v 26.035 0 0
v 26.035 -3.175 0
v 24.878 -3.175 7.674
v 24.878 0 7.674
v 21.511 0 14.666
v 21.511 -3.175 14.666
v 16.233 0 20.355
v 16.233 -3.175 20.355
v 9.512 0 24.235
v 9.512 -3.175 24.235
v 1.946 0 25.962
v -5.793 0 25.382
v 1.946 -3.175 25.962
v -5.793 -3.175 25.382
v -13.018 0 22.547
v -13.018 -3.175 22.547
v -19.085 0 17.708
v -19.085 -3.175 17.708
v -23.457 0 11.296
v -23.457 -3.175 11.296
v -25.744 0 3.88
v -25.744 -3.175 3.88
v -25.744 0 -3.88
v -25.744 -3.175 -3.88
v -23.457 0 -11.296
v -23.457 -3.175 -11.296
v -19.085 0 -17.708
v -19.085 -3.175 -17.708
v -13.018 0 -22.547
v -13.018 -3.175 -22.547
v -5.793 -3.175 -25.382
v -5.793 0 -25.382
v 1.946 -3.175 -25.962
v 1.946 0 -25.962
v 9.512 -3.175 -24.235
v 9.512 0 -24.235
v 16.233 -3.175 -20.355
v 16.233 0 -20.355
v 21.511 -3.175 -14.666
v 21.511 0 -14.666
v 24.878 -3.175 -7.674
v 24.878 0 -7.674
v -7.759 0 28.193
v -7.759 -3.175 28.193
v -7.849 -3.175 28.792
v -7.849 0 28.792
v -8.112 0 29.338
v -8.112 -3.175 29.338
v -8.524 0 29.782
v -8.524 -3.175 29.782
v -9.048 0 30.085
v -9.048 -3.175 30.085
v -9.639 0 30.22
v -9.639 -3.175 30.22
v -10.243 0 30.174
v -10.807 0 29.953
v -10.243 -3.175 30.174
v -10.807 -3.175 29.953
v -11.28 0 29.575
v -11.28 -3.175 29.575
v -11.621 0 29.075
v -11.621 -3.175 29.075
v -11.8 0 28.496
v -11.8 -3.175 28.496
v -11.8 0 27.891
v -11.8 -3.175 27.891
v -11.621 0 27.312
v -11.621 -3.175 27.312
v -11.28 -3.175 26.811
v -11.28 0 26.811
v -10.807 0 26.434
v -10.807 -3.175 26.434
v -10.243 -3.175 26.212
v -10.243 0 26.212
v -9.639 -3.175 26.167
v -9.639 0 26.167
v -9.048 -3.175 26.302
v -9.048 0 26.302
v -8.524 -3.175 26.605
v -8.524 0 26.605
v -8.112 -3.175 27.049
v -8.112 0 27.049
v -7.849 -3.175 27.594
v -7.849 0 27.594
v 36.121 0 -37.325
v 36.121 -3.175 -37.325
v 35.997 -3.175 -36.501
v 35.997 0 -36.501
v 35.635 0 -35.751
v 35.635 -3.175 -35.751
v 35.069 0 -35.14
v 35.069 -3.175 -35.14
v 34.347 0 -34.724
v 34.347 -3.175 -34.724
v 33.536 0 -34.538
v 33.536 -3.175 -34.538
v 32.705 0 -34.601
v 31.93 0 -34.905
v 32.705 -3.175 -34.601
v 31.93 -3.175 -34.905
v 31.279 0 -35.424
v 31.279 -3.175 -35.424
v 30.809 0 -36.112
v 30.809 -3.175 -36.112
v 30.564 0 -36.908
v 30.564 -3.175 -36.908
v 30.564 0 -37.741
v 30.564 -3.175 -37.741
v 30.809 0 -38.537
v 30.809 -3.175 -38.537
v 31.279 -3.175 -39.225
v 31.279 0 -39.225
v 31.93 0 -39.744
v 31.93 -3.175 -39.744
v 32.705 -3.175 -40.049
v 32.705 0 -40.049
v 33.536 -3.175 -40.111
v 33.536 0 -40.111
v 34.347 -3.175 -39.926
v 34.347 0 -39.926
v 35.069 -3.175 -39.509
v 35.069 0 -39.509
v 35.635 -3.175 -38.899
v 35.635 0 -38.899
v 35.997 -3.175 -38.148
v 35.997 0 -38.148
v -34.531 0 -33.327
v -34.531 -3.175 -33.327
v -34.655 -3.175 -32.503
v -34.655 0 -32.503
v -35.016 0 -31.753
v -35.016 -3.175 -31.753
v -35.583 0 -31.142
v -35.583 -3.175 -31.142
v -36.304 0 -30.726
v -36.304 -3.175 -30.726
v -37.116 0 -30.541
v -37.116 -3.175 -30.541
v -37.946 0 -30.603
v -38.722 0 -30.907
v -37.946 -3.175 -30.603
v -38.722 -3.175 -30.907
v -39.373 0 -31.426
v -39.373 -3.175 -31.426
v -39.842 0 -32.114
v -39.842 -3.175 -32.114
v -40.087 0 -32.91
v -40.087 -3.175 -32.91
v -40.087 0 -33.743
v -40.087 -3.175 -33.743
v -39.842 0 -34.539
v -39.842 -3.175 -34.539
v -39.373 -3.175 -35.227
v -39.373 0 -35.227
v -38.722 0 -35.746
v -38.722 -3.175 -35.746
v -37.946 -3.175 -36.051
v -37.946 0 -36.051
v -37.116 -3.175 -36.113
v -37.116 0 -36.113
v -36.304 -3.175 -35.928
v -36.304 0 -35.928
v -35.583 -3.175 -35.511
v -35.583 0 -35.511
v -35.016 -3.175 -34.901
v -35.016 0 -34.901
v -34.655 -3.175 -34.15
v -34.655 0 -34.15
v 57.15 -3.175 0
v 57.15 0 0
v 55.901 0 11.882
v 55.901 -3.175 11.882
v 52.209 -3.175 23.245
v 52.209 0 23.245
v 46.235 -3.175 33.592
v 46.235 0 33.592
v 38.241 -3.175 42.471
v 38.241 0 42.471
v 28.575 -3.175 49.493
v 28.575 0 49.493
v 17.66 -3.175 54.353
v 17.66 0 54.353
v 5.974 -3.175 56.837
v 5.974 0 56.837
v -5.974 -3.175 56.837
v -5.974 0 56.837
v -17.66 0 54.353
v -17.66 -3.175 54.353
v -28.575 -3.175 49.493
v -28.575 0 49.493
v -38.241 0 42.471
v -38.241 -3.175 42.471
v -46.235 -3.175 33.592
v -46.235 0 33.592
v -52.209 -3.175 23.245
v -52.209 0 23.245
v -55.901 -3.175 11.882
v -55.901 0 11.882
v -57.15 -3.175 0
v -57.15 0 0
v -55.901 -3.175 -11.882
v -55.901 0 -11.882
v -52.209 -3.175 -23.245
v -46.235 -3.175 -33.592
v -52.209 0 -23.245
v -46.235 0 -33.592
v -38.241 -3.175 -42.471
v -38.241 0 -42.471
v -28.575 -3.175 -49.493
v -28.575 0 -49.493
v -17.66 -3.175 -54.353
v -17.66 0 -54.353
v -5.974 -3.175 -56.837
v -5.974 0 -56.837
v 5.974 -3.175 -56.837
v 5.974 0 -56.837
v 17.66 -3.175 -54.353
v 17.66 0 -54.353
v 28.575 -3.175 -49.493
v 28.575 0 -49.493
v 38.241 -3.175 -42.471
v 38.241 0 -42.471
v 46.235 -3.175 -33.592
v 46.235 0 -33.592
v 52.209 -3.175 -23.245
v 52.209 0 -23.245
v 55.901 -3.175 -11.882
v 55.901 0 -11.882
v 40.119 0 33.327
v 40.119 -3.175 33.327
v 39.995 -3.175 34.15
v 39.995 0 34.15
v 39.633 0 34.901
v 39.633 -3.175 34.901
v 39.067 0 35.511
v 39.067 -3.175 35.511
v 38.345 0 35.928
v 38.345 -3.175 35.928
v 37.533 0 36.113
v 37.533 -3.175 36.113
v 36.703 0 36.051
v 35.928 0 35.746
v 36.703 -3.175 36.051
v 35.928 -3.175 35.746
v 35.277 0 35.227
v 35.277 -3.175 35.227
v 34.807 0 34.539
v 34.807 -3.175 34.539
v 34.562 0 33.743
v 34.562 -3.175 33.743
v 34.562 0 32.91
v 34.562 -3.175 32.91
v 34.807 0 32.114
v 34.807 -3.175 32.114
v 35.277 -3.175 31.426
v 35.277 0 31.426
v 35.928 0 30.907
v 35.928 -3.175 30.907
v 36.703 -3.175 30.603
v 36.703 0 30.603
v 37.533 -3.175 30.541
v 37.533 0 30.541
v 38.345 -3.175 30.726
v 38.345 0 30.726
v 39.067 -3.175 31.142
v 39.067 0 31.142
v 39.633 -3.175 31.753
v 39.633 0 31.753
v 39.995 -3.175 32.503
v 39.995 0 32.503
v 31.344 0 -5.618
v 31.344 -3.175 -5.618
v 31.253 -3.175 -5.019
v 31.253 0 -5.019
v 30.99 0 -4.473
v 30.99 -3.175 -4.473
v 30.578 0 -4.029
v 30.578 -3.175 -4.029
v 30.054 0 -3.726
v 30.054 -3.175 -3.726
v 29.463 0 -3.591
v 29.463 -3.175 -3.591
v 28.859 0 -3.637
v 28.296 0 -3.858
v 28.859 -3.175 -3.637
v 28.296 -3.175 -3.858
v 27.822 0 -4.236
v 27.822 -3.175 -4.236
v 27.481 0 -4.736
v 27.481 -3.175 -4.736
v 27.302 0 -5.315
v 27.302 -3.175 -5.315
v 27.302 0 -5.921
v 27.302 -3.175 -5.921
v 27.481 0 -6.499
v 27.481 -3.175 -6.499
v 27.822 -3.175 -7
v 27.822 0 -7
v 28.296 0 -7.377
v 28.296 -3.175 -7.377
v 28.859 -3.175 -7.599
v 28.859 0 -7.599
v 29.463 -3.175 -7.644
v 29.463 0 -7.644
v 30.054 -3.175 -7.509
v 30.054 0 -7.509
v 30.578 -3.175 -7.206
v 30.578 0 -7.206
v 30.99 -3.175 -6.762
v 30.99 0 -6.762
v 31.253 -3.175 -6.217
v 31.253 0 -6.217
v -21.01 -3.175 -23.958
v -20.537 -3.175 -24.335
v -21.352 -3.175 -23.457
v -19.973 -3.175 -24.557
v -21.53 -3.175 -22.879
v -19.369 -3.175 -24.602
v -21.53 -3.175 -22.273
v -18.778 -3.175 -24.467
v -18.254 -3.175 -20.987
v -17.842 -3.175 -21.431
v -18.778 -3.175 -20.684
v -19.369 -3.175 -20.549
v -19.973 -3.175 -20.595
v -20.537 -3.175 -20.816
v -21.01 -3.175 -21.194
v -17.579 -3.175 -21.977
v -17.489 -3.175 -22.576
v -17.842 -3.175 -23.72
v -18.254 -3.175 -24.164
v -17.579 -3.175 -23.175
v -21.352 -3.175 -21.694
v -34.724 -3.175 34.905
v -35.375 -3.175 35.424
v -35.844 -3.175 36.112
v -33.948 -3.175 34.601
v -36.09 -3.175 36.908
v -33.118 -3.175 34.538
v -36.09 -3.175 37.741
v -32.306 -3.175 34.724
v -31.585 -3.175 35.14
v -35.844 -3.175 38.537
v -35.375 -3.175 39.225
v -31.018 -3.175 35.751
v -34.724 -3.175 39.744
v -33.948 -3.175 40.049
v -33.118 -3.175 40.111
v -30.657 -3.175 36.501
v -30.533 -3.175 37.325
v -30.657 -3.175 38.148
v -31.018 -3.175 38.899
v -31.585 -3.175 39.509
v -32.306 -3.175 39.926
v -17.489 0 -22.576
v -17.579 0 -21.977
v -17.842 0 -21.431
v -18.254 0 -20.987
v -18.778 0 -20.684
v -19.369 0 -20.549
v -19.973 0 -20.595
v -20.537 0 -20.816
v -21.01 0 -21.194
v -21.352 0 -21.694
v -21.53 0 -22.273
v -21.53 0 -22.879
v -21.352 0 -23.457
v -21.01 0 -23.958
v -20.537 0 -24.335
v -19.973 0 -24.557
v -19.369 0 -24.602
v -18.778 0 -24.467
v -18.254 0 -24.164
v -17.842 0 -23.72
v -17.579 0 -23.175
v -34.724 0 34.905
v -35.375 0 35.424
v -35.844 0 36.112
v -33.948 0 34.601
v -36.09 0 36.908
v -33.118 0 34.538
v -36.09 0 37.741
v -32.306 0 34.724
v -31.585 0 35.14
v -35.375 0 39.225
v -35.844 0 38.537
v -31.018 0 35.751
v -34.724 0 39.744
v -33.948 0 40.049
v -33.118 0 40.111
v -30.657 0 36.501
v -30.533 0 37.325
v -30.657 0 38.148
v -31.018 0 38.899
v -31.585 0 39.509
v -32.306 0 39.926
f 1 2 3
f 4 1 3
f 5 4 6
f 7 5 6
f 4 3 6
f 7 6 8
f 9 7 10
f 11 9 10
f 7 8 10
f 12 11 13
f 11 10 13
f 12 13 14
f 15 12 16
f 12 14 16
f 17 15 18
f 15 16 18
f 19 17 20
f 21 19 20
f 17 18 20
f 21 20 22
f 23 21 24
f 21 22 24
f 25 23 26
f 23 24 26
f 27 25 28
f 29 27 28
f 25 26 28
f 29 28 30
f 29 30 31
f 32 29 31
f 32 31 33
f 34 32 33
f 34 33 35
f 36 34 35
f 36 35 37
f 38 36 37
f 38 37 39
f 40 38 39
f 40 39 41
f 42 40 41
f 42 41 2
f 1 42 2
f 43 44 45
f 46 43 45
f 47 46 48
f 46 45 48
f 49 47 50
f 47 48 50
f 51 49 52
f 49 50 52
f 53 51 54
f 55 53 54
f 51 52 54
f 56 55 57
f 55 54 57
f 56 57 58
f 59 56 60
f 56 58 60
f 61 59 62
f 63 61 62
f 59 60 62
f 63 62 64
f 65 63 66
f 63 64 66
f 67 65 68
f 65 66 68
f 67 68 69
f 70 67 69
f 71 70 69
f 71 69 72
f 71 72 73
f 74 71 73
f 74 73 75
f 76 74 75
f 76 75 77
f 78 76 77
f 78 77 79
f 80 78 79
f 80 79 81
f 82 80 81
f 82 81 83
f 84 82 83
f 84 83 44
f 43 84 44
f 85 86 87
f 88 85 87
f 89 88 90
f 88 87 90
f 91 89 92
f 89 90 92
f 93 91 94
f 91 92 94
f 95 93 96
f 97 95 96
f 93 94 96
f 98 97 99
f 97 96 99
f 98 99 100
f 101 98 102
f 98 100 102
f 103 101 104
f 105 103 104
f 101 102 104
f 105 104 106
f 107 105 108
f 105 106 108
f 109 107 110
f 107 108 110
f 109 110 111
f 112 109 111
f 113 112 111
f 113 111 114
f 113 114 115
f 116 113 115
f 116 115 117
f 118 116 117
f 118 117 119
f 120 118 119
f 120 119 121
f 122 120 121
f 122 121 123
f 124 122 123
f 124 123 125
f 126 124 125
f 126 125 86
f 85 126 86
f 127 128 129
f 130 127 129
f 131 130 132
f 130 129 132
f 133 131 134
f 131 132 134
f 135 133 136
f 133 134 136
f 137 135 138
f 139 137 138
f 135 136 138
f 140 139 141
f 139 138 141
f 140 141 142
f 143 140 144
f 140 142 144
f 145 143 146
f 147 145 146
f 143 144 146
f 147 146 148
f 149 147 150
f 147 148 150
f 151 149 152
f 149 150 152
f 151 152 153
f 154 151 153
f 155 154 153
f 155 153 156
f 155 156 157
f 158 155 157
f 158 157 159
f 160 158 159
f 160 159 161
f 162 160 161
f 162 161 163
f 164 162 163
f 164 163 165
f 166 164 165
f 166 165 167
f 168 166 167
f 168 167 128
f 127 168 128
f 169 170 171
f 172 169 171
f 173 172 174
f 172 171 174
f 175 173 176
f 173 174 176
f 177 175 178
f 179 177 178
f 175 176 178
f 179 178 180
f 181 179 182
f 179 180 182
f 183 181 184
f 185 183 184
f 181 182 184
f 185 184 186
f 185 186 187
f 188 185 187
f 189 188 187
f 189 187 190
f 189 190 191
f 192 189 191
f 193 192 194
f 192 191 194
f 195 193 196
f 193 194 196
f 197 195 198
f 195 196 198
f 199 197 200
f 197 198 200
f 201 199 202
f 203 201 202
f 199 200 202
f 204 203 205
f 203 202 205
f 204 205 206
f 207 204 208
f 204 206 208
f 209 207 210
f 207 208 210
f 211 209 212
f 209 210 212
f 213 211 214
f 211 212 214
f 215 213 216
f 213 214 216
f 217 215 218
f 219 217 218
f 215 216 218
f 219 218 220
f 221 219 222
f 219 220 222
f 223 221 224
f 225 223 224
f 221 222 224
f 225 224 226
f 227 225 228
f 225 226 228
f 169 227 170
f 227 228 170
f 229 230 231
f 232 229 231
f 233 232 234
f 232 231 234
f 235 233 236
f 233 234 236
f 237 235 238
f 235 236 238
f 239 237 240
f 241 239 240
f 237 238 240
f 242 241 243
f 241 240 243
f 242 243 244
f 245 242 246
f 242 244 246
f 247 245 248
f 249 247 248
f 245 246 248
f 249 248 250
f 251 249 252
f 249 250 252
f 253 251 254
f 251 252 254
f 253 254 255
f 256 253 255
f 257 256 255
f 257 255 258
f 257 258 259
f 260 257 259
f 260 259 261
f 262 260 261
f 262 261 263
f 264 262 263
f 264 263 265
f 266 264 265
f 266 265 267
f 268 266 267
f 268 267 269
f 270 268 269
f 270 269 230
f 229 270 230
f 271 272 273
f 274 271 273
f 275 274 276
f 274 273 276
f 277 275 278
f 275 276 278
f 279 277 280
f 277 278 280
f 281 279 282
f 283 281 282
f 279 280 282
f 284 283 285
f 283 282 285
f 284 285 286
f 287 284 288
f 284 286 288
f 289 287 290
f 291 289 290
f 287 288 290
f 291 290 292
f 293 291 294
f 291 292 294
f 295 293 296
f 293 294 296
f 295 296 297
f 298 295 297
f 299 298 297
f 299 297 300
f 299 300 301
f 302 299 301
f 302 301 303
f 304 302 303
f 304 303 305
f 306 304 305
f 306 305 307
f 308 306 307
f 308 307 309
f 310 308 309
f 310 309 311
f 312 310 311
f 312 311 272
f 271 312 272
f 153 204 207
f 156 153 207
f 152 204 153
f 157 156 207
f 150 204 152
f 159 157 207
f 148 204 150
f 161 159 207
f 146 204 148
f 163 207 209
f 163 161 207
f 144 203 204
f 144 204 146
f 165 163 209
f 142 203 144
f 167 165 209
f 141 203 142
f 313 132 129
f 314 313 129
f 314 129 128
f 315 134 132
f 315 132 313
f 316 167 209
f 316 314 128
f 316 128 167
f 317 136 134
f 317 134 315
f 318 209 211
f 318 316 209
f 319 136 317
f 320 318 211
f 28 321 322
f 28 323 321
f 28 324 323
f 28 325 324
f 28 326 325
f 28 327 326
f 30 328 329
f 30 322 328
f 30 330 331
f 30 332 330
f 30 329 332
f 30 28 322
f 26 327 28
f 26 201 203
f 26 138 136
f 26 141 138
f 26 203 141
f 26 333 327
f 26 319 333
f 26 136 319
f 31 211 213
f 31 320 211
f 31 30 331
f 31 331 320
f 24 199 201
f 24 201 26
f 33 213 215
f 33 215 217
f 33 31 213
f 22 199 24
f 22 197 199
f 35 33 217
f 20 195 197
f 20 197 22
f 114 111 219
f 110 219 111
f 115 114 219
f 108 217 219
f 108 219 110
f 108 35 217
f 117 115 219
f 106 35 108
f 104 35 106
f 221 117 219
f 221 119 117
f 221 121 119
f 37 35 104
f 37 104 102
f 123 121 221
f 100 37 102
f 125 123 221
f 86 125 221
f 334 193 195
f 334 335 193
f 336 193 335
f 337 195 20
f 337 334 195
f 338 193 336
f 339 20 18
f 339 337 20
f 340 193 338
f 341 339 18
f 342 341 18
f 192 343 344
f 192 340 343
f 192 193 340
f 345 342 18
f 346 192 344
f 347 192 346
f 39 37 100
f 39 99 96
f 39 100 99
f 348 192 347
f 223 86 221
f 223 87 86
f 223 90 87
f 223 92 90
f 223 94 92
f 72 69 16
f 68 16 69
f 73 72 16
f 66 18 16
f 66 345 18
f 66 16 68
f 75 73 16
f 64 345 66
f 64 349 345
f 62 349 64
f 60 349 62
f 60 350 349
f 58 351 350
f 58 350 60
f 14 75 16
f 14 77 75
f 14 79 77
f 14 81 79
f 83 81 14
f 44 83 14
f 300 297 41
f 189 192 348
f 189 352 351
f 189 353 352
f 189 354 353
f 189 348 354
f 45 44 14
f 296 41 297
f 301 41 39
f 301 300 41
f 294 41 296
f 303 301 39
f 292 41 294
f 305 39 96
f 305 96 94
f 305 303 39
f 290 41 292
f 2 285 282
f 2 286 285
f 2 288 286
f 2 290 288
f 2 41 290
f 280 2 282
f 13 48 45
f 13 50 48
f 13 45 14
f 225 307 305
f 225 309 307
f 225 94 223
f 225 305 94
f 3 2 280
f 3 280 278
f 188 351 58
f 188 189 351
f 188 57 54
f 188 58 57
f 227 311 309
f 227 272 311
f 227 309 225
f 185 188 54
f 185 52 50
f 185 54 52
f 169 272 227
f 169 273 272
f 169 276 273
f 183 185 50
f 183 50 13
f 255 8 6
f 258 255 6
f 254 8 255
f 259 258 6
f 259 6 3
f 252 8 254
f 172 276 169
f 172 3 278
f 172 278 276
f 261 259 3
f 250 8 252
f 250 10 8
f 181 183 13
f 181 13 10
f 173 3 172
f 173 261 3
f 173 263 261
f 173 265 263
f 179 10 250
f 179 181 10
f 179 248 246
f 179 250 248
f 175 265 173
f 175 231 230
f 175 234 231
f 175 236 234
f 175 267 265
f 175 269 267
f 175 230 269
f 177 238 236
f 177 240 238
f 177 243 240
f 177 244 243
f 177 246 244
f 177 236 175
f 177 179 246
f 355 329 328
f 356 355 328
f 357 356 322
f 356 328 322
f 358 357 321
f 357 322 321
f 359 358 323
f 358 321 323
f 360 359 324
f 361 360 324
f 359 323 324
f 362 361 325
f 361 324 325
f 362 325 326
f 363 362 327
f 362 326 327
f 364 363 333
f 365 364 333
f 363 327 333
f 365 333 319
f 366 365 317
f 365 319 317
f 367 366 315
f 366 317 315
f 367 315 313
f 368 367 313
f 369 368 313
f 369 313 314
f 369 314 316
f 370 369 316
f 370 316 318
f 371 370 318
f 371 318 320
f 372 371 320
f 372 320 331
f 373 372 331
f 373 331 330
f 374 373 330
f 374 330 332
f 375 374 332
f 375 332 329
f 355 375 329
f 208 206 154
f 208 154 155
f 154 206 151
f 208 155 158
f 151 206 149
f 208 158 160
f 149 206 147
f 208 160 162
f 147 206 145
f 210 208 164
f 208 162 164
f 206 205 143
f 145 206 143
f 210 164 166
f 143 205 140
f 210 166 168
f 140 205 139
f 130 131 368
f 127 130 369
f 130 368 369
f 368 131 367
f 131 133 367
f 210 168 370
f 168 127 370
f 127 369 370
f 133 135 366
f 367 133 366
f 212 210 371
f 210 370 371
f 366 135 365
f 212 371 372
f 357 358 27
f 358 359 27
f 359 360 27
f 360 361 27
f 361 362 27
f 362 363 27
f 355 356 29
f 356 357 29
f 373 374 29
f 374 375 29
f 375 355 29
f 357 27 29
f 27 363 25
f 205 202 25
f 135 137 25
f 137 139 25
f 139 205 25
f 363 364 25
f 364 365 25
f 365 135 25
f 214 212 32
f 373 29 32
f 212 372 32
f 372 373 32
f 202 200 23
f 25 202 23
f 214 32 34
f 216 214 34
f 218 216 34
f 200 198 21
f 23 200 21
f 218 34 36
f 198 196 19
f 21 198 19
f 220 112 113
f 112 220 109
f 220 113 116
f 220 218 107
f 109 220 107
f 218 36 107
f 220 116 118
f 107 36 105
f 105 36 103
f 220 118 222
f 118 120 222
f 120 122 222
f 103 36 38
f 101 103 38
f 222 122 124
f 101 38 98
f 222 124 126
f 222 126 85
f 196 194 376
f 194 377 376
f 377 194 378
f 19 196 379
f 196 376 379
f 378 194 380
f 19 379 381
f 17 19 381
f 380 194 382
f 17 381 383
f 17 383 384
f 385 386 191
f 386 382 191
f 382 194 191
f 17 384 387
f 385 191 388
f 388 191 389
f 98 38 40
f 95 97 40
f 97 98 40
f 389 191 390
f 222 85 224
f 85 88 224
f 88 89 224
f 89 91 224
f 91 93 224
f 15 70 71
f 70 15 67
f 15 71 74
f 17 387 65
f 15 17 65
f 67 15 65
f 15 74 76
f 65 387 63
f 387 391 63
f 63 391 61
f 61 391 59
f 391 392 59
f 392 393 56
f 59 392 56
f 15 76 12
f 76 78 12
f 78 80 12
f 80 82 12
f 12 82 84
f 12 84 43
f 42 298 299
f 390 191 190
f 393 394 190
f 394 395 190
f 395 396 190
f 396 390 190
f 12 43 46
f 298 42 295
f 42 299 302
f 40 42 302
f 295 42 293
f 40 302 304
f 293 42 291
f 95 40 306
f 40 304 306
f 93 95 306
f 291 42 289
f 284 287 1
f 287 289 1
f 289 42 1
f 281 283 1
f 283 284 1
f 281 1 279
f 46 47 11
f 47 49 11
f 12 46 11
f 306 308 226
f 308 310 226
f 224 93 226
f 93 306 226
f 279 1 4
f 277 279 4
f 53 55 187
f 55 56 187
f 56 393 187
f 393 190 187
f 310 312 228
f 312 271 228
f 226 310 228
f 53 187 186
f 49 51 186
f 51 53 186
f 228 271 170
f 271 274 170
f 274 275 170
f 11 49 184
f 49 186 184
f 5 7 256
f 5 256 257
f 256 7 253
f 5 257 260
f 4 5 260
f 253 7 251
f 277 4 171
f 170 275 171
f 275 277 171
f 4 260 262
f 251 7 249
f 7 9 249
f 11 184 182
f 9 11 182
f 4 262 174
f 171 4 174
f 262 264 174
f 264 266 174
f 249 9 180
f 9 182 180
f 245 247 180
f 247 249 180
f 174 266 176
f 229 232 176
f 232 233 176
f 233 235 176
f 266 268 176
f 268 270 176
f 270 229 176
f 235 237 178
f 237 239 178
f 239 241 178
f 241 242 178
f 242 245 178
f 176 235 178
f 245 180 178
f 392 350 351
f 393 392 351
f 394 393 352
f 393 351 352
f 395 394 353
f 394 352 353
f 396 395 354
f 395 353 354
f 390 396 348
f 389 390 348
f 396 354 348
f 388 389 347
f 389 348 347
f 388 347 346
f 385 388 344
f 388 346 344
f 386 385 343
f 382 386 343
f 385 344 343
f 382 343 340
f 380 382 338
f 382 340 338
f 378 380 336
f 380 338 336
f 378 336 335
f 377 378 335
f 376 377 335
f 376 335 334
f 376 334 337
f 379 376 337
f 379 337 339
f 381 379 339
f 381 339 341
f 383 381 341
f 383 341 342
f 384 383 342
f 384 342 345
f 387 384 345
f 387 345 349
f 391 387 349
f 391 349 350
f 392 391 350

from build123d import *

# Parameters (mm, degrees)
F0_R     = 57.15
F1_DEPTH = 3.175
F2_R     = 2.794
F3_DEPTH = 25.4
F4_R     = 26.035
F4_R_2   = 2.032
F5_DEPTH = 25.4


with BuildPart() as f1:
    # F0 (on Front) → F1 (new body)
    with BuildSketch(Plane.XZ):
        Circle(F0_R)
    extrude(amount=F1_DEPTH)

    # F2 (on face) → F3 (cut)
    with BuildSketch(Plane.XZ.offset(3.175)):
        with Locations((-33.326707, 37.324684)):
            Circle(F2_R)
        with Locations((-37.324684, -33.326707)):
            Circle(F2_R)
        with Locations((33.326707, -37.324684)):
            Circle(F2_R)
        with Locations((37.324684, 33.326707)):
            Circle(F2_R)
    extrude(amount=-F3_DEPTH, mode=Mode.SUBTRACT)

    # F4 (on face) → F5 (cut)
    with BuildSketch(Plane.XZ.offset(3.175)):
        Circle(F4_R)
        with Locations((-9.790665, 28.193384)):
            Circle(F4_R_2)
        with Locations((-19.520854, -22.575657)):
            Circle(F4_R_2)
        with Locations((29.311519, -5.617728)):
            Circle(F4_R_2)
    extrude(amount=-F5_DEPTH, mode=Mode.SUBTRACT)


solid = f1.part
